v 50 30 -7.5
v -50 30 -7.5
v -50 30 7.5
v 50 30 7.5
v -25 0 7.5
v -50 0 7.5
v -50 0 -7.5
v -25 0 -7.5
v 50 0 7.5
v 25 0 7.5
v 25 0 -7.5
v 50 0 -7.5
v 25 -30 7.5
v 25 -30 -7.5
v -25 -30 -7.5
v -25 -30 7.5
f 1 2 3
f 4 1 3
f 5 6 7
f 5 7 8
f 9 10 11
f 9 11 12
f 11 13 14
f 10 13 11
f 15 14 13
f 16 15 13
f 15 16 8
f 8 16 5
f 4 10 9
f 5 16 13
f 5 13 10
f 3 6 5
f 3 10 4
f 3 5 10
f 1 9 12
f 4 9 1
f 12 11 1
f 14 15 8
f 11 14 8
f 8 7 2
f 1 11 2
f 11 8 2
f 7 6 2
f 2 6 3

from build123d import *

# Parameters (mm, degrees)
PLAT_W                      = 60
PLAT_H                      = 15
EL_MENT_M_CANO_SOUD_1_DEPTH = 100
ESQUISSE2_W                 = 25
ESQUISSE2_H                 = 30
ENL_V_MAT_EXTRU_1_DEPTH     = 20


with BuildPart() as part:
    # plat → Elément mécano-soudé1 (new body)
    with BuildSketch(Plane.YZ.offset(-50)):
        Rectangle(PLAT_W, PLAT_H)
    extrude(amount=EL_MENT_M_CANO_SOUD_1_DEPTH)

    # Esquisse2 → Enlèv. mat.-Extru.1 (cut)
    with BuildSketch(Plane.XY.offset(7.5)):
        with Locations((-37.5, -15)):
            Rectangle(ESQUISSE2_W, ESQUISSE2_H)
        with Locations((37.5, -15)):
            Rectangle(ESQUISSE2_W, ESQUISSE2_H)
    extrude(amount=-ENL_V_MAT_EXTRU_1_DEPTH, mode=Mode.SUBTRACT)


solid = part.part
